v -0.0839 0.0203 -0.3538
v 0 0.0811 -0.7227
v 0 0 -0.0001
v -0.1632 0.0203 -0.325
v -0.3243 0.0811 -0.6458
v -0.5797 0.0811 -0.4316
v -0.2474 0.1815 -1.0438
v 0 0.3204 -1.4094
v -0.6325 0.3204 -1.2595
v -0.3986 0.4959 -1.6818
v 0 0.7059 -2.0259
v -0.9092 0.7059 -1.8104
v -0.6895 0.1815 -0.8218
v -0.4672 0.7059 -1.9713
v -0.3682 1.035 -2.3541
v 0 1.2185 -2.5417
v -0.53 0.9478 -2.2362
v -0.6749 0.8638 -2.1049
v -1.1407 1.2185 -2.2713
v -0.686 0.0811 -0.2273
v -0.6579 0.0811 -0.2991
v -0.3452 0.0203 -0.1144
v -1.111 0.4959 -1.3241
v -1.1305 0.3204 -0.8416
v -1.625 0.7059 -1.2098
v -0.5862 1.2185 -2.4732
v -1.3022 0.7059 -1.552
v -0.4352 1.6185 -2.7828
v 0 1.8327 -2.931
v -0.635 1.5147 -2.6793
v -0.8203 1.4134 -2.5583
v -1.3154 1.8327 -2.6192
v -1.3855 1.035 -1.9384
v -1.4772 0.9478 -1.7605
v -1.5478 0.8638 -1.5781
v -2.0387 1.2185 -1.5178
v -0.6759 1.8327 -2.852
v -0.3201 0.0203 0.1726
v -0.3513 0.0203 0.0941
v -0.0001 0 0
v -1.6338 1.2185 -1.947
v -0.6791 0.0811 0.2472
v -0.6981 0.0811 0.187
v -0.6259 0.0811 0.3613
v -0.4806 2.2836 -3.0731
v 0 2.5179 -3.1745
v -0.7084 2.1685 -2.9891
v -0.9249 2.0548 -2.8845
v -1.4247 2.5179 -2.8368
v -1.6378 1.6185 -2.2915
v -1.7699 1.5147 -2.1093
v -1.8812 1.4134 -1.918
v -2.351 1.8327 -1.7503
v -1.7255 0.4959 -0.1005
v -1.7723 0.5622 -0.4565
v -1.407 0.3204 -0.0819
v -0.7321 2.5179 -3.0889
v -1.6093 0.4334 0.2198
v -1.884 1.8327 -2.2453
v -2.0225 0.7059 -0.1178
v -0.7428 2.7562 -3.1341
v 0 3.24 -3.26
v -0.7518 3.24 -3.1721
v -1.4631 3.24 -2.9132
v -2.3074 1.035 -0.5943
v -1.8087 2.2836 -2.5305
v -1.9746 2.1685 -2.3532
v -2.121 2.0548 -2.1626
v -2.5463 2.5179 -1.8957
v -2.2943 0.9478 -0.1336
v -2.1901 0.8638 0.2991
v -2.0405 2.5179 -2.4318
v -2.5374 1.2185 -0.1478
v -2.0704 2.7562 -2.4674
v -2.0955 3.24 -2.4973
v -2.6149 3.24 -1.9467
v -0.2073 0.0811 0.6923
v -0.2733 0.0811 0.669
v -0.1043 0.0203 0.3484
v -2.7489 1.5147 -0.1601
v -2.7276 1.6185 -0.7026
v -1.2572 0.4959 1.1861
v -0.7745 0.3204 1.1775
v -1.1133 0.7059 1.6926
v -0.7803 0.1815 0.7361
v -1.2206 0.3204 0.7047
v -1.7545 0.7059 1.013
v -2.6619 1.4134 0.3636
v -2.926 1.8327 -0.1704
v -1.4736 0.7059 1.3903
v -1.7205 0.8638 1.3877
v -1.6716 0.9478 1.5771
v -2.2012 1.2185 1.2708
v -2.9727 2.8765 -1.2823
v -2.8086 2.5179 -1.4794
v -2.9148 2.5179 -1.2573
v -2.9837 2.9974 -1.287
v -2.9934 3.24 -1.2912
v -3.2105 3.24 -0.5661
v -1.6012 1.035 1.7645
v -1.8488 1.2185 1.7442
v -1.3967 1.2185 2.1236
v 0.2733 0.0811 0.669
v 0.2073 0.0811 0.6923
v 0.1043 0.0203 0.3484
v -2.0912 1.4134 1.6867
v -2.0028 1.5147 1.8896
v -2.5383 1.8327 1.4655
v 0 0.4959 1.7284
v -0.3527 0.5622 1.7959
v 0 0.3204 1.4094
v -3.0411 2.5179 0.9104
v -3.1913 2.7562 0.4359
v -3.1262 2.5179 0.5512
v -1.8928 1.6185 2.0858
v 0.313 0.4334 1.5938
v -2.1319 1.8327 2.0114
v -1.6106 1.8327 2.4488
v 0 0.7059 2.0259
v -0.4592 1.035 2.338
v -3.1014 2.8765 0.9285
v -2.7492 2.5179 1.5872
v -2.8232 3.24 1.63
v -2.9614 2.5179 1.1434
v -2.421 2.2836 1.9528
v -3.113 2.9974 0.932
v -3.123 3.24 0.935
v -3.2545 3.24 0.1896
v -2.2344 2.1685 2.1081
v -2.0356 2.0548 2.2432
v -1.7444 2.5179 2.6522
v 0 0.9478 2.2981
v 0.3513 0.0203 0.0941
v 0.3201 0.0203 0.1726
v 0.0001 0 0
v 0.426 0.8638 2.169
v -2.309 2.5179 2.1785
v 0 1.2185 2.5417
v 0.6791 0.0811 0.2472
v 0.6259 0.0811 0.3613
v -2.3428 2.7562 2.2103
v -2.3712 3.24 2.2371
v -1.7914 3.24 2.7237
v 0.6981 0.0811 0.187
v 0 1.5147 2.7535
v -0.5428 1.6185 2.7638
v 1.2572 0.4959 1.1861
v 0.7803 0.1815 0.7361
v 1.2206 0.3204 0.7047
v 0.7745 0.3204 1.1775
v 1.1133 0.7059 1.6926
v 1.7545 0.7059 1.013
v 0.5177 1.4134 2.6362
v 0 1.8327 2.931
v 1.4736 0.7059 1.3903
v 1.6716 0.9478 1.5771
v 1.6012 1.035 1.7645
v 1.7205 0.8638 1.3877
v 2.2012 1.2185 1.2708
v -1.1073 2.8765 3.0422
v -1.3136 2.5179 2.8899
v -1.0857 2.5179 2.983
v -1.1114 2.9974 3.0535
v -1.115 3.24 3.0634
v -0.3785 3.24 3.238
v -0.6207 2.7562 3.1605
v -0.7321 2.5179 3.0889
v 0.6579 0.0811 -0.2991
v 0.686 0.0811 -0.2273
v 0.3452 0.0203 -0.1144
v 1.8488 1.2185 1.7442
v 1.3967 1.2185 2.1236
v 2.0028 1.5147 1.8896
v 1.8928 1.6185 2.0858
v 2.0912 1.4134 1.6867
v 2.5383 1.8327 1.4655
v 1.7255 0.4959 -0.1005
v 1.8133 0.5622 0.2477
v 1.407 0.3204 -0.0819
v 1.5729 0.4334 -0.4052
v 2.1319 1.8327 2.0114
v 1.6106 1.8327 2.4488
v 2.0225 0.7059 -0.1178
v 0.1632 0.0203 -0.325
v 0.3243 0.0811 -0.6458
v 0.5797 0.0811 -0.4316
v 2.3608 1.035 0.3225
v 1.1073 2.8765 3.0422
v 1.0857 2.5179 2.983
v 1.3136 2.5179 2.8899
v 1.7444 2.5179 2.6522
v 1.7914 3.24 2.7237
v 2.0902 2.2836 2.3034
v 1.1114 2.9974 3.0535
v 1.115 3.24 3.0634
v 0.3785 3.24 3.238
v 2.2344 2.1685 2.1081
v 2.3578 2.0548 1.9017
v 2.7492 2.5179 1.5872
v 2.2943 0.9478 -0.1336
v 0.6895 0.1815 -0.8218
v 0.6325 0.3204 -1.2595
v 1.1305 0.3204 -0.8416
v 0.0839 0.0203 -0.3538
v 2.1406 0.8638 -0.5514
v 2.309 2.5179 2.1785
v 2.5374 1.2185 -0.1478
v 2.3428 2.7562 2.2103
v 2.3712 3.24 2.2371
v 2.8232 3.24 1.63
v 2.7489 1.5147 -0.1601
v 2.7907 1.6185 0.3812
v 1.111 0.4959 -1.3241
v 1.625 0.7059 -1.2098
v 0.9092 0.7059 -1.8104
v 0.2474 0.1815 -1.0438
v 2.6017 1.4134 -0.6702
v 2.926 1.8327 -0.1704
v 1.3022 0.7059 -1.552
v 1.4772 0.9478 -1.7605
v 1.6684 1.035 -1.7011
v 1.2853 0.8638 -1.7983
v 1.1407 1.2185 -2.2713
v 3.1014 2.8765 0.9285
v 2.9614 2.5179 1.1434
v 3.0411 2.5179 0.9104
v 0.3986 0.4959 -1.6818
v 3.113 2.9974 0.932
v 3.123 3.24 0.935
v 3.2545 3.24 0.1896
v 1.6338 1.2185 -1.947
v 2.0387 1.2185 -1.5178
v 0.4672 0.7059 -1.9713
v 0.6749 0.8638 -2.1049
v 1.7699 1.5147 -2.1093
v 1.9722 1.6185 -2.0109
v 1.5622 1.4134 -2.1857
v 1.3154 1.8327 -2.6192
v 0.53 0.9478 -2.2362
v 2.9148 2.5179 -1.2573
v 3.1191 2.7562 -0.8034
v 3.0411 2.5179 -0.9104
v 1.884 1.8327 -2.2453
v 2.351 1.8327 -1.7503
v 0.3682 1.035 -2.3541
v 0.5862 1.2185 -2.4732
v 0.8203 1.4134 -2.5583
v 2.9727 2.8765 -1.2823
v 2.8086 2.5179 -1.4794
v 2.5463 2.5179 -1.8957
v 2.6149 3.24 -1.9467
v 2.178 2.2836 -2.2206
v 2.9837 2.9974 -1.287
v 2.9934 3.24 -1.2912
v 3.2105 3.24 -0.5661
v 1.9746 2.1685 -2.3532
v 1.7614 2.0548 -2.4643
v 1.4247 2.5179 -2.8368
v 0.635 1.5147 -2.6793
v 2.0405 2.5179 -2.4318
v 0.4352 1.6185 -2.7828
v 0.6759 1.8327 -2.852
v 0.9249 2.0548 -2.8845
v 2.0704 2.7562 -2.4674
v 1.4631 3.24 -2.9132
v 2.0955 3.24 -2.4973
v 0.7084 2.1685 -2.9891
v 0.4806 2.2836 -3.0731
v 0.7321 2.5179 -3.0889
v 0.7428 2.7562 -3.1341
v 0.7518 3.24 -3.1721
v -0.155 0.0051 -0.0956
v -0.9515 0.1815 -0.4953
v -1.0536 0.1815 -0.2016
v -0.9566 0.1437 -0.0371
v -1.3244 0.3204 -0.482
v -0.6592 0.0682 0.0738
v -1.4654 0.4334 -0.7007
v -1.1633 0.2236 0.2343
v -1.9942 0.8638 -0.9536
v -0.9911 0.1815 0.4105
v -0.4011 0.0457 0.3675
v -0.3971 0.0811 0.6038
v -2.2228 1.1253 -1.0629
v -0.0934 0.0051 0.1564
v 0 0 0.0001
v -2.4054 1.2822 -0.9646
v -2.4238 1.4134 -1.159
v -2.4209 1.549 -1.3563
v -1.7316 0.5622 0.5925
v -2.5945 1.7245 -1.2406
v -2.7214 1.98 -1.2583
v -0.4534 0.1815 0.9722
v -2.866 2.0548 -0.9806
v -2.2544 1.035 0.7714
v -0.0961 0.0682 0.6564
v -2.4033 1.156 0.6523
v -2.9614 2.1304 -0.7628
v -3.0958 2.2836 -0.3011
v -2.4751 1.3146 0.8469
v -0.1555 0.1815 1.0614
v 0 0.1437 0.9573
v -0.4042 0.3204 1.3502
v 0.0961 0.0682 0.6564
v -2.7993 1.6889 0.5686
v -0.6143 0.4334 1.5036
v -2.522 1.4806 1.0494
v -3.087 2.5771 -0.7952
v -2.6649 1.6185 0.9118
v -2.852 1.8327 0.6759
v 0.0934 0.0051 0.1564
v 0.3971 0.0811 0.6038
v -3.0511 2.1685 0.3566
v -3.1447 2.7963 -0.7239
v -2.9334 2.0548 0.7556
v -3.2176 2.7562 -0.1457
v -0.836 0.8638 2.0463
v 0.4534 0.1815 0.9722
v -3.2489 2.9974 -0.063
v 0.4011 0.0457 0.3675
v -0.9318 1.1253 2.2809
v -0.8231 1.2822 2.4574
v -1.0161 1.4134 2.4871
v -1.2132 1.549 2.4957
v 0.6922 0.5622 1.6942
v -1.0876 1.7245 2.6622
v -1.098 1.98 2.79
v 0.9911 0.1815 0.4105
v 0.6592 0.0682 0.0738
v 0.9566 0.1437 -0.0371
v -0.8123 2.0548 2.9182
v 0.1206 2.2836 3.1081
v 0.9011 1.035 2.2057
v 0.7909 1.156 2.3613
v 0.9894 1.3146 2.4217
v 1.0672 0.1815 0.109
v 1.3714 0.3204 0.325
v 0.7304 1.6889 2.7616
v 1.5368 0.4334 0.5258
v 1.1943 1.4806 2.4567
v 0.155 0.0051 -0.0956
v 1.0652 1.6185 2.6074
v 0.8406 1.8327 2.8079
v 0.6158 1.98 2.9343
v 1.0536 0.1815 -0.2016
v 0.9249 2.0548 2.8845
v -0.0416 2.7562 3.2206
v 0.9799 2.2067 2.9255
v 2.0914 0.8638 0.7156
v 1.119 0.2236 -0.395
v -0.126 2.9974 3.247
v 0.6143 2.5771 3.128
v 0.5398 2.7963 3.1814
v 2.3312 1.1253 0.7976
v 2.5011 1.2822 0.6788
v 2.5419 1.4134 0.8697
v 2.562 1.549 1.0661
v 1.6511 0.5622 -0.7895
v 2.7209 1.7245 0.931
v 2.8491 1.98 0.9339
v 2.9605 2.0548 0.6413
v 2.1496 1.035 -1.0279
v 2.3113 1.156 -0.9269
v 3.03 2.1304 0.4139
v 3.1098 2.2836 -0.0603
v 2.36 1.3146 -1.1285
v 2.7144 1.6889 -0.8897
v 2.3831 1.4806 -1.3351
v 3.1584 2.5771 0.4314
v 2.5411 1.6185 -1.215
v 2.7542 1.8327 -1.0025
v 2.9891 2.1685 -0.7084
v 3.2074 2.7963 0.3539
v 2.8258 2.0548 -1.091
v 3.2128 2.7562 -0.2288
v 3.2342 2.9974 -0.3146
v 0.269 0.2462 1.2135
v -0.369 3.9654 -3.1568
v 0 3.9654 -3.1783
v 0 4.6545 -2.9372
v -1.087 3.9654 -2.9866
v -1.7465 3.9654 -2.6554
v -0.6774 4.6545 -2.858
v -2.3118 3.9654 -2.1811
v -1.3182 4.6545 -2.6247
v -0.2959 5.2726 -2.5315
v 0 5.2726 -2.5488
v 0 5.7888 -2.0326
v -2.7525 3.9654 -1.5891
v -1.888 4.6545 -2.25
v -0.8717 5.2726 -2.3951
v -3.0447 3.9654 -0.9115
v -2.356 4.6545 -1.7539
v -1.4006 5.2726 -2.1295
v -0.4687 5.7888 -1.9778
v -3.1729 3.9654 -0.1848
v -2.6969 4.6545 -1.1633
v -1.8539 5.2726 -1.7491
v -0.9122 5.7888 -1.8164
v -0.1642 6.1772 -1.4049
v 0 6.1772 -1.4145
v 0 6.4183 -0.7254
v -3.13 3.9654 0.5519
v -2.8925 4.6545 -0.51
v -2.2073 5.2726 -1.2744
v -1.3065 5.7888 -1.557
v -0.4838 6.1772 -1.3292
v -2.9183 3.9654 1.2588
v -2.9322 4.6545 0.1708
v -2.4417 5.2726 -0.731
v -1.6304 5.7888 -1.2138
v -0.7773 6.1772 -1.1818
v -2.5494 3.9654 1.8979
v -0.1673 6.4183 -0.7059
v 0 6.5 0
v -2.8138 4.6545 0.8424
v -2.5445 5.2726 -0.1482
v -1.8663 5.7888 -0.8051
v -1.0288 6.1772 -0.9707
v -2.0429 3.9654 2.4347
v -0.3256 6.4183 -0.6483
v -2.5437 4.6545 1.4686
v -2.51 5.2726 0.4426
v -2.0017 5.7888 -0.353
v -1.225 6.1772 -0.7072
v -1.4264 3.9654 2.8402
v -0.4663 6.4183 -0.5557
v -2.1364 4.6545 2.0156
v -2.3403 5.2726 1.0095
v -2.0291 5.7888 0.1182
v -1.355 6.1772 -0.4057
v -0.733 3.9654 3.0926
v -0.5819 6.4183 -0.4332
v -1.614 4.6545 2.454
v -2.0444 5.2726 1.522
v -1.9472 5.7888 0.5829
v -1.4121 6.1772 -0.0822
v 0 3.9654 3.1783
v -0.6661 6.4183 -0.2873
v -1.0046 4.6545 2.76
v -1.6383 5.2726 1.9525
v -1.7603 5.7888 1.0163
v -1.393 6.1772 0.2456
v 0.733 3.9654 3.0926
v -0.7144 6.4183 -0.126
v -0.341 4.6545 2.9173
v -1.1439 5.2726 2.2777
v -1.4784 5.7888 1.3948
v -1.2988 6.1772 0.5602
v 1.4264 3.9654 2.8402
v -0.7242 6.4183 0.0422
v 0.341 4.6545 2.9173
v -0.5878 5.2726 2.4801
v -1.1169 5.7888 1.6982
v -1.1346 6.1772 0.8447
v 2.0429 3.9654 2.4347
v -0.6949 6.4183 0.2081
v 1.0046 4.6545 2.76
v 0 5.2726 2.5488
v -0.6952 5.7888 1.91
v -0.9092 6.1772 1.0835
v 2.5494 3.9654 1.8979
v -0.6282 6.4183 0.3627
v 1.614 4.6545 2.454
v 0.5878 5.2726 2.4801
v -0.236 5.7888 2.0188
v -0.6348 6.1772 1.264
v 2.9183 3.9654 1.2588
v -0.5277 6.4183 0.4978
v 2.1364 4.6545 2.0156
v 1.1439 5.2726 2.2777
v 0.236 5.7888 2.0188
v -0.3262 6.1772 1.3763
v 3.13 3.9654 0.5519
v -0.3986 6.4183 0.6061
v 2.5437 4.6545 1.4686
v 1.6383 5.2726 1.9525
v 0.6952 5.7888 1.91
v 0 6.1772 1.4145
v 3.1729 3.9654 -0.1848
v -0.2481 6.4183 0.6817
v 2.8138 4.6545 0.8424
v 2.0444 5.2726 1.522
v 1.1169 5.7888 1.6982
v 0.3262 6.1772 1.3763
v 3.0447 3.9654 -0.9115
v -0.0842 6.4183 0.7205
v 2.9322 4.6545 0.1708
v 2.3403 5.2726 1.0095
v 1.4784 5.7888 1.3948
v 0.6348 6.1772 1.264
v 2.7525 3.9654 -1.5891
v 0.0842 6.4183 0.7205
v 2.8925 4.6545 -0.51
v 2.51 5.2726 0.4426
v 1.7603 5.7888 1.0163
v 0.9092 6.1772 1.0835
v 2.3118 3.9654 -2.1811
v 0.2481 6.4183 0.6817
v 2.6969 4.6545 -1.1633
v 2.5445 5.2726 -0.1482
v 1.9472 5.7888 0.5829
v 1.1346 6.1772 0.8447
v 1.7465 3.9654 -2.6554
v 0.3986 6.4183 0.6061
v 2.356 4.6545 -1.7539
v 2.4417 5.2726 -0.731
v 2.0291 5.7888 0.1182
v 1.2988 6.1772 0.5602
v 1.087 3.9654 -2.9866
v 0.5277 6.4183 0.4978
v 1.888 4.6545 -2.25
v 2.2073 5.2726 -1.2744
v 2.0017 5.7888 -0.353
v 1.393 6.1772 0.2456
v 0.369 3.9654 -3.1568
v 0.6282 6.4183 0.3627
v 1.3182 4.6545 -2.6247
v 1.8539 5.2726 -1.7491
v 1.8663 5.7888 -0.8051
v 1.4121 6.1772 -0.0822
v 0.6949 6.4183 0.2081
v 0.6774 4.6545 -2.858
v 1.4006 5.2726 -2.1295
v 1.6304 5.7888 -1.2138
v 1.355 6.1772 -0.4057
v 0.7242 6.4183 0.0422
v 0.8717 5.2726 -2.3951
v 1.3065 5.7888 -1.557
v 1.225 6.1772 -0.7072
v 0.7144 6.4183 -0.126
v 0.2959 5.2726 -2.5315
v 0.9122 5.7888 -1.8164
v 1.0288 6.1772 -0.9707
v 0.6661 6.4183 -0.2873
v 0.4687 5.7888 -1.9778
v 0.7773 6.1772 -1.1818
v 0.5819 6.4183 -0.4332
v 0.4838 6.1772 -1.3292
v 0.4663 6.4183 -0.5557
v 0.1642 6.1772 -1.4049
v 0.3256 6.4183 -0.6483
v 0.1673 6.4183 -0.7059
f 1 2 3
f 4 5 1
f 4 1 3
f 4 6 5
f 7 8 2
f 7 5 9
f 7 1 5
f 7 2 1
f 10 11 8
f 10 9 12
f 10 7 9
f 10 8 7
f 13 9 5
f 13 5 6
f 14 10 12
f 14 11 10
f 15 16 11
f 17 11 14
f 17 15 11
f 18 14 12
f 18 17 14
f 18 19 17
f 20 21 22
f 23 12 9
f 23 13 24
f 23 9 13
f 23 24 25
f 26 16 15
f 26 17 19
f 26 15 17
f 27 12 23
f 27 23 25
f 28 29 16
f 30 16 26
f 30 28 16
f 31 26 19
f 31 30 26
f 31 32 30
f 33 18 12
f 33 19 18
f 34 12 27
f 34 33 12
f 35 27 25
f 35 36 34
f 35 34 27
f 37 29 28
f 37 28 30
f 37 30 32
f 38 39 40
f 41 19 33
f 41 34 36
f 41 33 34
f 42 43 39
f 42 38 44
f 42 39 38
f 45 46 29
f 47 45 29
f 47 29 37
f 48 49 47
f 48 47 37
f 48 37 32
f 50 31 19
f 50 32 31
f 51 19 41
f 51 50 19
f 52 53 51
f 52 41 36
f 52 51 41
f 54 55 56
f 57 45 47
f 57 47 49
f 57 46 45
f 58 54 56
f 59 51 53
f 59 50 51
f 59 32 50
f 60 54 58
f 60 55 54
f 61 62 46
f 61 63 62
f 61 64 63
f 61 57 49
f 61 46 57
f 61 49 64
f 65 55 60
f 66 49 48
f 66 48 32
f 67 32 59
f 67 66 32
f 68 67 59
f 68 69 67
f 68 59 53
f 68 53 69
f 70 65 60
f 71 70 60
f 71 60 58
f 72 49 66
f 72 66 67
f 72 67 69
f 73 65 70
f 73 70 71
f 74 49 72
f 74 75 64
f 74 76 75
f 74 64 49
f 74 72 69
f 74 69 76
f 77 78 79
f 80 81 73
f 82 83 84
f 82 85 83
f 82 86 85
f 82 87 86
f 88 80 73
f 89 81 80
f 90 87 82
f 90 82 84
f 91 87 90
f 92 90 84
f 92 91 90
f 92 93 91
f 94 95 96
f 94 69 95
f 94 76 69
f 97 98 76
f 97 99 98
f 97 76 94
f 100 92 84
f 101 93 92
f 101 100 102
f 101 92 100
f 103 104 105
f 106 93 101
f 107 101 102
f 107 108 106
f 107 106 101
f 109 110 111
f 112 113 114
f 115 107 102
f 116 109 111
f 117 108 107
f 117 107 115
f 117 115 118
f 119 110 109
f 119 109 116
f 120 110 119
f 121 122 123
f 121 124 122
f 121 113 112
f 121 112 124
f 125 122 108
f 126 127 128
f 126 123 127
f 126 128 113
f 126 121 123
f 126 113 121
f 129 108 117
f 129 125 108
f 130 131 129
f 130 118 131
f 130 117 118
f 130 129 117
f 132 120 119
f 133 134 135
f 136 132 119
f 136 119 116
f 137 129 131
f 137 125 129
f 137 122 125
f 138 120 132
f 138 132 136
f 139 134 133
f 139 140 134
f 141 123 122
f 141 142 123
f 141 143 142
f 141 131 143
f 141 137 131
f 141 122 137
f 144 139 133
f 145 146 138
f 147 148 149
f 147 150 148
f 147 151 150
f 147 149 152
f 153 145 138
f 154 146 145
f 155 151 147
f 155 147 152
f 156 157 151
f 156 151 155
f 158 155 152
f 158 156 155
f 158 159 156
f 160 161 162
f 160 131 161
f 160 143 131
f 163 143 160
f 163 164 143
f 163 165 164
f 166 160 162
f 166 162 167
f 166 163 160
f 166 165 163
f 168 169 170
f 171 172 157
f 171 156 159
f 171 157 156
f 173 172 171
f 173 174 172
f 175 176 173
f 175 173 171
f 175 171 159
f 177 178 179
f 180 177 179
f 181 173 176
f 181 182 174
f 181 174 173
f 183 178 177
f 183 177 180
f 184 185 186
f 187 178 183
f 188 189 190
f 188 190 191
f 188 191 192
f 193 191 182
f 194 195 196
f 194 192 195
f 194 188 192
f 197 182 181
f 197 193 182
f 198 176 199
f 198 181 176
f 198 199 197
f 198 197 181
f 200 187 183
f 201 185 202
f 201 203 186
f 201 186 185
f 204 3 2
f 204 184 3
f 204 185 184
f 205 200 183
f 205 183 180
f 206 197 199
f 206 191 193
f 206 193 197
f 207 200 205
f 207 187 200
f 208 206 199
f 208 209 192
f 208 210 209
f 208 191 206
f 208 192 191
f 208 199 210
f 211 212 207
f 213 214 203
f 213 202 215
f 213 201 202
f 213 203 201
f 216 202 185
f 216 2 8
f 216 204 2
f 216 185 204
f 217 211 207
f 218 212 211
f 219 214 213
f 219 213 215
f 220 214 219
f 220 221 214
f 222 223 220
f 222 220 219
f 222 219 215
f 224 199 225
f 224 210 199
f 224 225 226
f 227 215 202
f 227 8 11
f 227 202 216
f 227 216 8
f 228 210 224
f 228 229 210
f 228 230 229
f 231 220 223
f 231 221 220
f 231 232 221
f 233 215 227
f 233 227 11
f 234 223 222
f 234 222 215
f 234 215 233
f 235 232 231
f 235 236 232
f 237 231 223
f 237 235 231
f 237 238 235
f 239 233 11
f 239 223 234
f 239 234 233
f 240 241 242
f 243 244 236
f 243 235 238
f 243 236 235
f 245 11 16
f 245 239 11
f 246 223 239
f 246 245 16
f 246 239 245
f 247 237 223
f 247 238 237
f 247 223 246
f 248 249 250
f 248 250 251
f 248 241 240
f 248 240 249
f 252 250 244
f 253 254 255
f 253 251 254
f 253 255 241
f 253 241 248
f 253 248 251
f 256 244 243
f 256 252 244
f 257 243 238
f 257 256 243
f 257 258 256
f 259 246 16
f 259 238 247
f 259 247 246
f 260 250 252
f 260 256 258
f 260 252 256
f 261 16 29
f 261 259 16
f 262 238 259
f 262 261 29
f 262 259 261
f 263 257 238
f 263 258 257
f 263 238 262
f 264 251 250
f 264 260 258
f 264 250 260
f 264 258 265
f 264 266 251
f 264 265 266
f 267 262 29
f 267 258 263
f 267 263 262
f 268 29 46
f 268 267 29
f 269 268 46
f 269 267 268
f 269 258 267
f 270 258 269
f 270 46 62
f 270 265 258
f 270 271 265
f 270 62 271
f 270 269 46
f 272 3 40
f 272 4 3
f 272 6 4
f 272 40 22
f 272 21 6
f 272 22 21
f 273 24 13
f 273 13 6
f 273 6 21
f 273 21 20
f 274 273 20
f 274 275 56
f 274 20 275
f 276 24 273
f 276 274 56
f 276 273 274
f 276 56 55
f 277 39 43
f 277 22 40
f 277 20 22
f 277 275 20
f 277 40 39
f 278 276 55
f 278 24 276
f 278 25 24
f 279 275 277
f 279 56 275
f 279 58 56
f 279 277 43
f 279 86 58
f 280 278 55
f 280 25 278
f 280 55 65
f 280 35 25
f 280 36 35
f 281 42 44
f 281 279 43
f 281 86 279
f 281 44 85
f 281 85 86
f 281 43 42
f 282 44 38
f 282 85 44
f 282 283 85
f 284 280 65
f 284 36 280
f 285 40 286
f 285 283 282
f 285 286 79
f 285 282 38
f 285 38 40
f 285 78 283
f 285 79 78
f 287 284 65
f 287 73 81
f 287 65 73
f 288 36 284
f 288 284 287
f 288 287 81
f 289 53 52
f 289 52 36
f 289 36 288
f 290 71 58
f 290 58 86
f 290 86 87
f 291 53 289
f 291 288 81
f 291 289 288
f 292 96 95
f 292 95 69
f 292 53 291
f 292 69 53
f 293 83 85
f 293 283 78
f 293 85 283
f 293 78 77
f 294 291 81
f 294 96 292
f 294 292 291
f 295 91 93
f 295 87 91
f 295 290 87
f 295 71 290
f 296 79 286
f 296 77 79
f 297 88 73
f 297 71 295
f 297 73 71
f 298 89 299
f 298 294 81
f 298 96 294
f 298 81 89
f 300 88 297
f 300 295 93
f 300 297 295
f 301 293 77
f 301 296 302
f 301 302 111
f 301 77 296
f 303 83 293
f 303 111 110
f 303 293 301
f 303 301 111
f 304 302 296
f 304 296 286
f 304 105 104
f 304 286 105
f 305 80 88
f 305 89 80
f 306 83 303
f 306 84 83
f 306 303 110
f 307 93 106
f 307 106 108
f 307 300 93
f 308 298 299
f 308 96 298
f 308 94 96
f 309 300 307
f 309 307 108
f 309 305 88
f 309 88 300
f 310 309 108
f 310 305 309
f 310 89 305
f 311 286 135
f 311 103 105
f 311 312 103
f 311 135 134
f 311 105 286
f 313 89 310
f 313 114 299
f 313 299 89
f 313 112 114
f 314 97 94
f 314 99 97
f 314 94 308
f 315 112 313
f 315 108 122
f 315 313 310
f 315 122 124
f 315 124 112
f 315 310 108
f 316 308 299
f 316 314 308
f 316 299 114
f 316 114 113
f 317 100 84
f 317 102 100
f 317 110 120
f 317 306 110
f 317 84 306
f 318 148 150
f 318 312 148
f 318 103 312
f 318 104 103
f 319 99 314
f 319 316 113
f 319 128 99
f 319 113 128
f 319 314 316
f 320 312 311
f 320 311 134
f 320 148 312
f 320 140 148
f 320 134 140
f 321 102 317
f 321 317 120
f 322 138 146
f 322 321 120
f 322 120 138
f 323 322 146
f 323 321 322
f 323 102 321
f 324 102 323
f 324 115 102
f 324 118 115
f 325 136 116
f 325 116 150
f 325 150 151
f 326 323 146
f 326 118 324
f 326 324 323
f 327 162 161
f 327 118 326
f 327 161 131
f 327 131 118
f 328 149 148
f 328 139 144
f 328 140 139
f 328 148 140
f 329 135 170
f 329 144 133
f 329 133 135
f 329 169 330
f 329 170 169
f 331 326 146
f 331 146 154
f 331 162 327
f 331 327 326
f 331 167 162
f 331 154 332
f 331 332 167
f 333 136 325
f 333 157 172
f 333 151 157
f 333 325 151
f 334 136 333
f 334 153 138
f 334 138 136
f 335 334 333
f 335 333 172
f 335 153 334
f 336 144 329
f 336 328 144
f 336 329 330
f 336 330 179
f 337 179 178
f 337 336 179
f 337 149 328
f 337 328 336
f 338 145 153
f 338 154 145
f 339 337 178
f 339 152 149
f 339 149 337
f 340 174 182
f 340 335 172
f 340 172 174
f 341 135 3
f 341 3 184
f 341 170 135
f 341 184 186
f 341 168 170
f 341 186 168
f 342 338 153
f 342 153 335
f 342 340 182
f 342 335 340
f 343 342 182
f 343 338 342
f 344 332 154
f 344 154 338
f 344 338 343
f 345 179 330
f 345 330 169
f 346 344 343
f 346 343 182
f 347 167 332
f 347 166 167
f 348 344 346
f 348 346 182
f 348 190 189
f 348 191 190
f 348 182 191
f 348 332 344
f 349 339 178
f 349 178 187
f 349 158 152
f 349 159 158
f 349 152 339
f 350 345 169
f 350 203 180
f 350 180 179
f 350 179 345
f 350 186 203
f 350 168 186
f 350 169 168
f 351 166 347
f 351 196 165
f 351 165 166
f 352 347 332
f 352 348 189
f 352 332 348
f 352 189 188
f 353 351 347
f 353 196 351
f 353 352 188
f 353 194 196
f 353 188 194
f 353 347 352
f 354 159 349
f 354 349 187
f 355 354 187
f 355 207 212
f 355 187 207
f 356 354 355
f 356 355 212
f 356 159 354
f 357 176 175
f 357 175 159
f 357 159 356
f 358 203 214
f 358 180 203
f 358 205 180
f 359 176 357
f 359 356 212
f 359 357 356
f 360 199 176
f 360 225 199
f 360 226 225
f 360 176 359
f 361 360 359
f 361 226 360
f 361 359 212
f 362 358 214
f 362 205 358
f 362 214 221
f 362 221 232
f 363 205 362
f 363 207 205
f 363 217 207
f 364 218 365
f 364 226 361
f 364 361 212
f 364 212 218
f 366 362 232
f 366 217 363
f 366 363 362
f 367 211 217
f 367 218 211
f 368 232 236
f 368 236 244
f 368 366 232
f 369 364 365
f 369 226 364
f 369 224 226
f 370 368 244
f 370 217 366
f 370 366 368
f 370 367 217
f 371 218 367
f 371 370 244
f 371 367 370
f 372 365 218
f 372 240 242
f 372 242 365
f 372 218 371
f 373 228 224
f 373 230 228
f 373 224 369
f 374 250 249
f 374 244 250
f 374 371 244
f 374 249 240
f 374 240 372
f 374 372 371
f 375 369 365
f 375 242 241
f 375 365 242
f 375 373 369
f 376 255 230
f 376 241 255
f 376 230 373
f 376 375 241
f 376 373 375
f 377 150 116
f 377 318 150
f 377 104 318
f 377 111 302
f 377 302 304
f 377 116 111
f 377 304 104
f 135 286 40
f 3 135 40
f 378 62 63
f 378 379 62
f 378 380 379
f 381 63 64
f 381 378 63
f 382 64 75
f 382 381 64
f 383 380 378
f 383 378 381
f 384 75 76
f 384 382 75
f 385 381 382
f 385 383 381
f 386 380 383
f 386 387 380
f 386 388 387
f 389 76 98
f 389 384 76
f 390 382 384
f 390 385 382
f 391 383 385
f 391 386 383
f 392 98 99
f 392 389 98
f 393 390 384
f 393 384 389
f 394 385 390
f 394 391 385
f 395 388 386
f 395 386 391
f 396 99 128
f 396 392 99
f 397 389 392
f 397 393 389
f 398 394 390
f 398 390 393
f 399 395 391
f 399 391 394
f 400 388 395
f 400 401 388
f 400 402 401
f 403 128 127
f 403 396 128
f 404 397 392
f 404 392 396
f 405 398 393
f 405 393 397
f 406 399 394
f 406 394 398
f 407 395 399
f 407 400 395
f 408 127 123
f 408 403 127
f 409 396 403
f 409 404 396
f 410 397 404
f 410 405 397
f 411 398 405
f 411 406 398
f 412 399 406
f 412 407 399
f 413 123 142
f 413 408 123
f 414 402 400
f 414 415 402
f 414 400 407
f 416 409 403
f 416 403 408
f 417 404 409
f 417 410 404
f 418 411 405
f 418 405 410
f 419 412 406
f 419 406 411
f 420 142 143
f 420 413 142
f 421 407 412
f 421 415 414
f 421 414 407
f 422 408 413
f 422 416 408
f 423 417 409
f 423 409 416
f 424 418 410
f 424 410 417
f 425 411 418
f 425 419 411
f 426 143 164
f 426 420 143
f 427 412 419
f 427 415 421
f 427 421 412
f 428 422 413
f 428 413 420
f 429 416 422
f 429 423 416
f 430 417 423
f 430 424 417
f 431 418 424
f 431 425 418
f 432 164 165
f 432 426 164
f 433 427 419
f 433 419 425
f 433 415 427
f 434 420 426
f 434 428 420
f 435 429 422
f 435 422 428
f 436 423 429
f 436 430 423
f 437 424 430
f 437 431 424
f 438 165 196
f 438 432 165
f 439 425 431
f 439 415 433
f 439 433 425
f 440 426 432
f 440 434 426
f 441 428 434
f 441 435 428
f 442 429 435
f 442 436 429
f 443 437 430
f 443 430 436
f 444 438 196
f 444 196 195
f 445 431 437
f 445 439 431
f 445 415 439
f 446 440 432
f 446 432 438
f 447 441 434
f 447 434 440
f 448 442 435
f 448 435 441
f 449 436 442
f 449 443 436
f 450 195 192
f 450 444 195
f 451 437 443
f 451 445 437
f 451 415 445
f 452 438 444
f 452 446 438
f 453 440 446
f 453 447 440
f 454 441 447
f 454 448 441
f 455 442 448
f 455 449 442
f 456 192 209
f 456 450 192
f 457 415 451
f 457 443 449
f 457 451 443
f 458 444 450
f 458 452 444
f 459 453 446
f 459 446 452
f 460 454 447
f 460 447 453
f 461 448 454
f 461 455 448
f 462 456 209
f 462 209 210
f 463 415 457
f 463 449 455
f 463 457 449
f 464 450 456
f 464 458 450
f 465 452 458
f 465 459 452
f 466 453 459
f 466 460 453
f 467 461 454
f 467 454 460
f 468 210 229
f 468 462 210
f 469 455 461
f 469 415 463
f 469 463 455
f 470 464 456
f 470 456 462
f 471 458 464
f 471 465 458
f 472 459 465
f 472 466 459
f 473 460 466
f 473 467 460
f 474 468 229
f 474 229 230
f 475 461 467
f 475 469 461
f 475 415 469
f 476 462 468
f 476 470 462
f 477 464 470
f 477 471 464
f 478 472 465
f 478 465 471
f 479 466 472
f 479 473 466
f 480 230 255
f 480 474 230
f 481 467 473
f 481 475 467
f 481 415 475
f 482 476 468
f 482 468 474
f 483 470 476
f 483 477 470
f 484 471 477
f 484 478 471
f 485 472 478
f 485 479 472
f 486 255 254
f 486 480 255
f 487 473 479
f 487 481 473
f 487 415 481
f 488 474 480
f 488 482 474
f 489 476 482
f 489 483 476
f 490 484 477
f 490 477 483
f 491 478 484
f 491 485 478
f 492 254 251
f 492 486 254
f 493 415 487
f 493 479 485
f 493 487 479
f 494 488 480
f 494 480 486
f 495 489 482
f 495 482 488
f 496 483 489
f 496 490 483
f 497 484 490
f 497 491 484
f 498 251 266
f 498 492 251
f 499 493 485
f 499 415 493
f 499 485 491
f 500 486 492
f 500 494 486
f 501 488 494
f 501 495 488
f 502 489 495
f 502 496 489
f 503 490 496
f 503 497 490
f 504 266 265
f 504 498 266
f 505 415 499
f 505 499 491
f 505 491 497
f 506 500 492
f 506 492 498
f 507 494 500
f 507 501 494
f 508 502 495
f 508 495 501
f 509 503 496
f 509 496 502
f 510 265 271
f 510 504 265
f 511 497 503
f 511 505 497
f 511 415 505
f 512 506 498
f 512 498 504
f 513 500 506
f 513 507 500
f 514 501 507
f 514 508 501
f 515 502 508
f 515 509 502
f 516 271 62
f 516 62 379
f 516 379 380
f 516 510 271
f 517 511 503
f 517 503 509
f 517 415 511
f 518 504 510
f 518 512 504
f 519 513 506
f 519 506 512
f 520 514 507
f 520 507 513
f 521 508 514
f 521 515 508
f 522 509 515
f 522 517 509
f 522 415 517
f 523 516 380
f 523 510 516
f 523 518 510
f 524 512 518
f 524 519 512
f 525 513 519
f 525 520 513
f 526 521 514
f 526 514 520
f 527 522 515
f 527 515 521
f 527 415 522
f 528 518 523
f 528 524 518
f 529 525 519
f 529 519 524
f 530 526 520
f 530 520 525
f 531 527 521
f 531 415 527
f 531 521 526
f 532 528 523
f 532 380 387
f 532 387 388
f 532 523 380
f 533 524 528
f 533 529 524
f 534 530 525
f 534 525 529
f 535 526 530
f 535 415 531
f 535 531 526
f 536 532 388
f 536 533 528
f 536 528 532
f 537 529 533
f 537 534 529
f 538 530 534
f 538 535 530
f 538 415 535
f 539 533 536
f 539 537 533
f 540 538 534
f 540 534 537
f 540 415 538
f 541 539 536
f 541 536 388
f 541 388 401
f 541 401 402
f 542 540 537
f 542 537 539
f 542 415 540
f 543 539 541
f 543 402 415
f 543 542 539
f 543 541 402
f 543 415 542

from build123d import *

# Parameters (mm, degrees)
SKETCH1_R           = 3.26
BOSS_EXTRUDE1_DEPTH = 6.5
FILLET1_R           = 3.26
FILLET2_R           = 3.26


with BuildPart() as part:
    # Sketch1 → Boss-Extrude1 (new body)
    with BuildSketch(Plane(origin=(0, 0, 0), x_dir=(1, 0, 0), z_dir=(0, 1, 0))):
        with Locations(Location((0, 0, 0), (0, 0, 90))):
            Circle(SKETCH1_R)
    extrude(amount=BOSS_EXTRUDE1_DEPTH)

    # Fillet1
    fillet1_edges = [part.edges().sort_by_distance(p)[0] for p in [
        (0, 6.5, 3.26),
    ]]
    fillet(fillet1_edges, radius=FILLET1_R)

    # Fillet2
    # the kernel refuses this fillet: 3.26 mm, written as the material it takes off along each edge
    with BuildSketch(Plane(origin=(0, 0, 0), x_dir=(0, 0, -1), z_dir=(1, 0, 0))) as fillet2_piece_1:
        with BuildLine():
            CenterArc((6.135e-05, 3.26), FILLET2_R, 270, 89.648489945)
            Line((6.135e-05, 0), (6.135e-05, -0.0652))
            Line((6.135e-05, -0.0652), (3.26, -0.0652))
            Line((3.26, -0.0652), (3.3252, 0))
            Line((3.3252, 0), (3.325198773, 3.2396))
            Line((3.325198773, 3.2396), (3.26, 3.24))
        make_face()
    revolve(axis=Axis((0, 0, 0), (0, 1, 0)), mode=Mode.SUBTRACT)


solid = part.part
